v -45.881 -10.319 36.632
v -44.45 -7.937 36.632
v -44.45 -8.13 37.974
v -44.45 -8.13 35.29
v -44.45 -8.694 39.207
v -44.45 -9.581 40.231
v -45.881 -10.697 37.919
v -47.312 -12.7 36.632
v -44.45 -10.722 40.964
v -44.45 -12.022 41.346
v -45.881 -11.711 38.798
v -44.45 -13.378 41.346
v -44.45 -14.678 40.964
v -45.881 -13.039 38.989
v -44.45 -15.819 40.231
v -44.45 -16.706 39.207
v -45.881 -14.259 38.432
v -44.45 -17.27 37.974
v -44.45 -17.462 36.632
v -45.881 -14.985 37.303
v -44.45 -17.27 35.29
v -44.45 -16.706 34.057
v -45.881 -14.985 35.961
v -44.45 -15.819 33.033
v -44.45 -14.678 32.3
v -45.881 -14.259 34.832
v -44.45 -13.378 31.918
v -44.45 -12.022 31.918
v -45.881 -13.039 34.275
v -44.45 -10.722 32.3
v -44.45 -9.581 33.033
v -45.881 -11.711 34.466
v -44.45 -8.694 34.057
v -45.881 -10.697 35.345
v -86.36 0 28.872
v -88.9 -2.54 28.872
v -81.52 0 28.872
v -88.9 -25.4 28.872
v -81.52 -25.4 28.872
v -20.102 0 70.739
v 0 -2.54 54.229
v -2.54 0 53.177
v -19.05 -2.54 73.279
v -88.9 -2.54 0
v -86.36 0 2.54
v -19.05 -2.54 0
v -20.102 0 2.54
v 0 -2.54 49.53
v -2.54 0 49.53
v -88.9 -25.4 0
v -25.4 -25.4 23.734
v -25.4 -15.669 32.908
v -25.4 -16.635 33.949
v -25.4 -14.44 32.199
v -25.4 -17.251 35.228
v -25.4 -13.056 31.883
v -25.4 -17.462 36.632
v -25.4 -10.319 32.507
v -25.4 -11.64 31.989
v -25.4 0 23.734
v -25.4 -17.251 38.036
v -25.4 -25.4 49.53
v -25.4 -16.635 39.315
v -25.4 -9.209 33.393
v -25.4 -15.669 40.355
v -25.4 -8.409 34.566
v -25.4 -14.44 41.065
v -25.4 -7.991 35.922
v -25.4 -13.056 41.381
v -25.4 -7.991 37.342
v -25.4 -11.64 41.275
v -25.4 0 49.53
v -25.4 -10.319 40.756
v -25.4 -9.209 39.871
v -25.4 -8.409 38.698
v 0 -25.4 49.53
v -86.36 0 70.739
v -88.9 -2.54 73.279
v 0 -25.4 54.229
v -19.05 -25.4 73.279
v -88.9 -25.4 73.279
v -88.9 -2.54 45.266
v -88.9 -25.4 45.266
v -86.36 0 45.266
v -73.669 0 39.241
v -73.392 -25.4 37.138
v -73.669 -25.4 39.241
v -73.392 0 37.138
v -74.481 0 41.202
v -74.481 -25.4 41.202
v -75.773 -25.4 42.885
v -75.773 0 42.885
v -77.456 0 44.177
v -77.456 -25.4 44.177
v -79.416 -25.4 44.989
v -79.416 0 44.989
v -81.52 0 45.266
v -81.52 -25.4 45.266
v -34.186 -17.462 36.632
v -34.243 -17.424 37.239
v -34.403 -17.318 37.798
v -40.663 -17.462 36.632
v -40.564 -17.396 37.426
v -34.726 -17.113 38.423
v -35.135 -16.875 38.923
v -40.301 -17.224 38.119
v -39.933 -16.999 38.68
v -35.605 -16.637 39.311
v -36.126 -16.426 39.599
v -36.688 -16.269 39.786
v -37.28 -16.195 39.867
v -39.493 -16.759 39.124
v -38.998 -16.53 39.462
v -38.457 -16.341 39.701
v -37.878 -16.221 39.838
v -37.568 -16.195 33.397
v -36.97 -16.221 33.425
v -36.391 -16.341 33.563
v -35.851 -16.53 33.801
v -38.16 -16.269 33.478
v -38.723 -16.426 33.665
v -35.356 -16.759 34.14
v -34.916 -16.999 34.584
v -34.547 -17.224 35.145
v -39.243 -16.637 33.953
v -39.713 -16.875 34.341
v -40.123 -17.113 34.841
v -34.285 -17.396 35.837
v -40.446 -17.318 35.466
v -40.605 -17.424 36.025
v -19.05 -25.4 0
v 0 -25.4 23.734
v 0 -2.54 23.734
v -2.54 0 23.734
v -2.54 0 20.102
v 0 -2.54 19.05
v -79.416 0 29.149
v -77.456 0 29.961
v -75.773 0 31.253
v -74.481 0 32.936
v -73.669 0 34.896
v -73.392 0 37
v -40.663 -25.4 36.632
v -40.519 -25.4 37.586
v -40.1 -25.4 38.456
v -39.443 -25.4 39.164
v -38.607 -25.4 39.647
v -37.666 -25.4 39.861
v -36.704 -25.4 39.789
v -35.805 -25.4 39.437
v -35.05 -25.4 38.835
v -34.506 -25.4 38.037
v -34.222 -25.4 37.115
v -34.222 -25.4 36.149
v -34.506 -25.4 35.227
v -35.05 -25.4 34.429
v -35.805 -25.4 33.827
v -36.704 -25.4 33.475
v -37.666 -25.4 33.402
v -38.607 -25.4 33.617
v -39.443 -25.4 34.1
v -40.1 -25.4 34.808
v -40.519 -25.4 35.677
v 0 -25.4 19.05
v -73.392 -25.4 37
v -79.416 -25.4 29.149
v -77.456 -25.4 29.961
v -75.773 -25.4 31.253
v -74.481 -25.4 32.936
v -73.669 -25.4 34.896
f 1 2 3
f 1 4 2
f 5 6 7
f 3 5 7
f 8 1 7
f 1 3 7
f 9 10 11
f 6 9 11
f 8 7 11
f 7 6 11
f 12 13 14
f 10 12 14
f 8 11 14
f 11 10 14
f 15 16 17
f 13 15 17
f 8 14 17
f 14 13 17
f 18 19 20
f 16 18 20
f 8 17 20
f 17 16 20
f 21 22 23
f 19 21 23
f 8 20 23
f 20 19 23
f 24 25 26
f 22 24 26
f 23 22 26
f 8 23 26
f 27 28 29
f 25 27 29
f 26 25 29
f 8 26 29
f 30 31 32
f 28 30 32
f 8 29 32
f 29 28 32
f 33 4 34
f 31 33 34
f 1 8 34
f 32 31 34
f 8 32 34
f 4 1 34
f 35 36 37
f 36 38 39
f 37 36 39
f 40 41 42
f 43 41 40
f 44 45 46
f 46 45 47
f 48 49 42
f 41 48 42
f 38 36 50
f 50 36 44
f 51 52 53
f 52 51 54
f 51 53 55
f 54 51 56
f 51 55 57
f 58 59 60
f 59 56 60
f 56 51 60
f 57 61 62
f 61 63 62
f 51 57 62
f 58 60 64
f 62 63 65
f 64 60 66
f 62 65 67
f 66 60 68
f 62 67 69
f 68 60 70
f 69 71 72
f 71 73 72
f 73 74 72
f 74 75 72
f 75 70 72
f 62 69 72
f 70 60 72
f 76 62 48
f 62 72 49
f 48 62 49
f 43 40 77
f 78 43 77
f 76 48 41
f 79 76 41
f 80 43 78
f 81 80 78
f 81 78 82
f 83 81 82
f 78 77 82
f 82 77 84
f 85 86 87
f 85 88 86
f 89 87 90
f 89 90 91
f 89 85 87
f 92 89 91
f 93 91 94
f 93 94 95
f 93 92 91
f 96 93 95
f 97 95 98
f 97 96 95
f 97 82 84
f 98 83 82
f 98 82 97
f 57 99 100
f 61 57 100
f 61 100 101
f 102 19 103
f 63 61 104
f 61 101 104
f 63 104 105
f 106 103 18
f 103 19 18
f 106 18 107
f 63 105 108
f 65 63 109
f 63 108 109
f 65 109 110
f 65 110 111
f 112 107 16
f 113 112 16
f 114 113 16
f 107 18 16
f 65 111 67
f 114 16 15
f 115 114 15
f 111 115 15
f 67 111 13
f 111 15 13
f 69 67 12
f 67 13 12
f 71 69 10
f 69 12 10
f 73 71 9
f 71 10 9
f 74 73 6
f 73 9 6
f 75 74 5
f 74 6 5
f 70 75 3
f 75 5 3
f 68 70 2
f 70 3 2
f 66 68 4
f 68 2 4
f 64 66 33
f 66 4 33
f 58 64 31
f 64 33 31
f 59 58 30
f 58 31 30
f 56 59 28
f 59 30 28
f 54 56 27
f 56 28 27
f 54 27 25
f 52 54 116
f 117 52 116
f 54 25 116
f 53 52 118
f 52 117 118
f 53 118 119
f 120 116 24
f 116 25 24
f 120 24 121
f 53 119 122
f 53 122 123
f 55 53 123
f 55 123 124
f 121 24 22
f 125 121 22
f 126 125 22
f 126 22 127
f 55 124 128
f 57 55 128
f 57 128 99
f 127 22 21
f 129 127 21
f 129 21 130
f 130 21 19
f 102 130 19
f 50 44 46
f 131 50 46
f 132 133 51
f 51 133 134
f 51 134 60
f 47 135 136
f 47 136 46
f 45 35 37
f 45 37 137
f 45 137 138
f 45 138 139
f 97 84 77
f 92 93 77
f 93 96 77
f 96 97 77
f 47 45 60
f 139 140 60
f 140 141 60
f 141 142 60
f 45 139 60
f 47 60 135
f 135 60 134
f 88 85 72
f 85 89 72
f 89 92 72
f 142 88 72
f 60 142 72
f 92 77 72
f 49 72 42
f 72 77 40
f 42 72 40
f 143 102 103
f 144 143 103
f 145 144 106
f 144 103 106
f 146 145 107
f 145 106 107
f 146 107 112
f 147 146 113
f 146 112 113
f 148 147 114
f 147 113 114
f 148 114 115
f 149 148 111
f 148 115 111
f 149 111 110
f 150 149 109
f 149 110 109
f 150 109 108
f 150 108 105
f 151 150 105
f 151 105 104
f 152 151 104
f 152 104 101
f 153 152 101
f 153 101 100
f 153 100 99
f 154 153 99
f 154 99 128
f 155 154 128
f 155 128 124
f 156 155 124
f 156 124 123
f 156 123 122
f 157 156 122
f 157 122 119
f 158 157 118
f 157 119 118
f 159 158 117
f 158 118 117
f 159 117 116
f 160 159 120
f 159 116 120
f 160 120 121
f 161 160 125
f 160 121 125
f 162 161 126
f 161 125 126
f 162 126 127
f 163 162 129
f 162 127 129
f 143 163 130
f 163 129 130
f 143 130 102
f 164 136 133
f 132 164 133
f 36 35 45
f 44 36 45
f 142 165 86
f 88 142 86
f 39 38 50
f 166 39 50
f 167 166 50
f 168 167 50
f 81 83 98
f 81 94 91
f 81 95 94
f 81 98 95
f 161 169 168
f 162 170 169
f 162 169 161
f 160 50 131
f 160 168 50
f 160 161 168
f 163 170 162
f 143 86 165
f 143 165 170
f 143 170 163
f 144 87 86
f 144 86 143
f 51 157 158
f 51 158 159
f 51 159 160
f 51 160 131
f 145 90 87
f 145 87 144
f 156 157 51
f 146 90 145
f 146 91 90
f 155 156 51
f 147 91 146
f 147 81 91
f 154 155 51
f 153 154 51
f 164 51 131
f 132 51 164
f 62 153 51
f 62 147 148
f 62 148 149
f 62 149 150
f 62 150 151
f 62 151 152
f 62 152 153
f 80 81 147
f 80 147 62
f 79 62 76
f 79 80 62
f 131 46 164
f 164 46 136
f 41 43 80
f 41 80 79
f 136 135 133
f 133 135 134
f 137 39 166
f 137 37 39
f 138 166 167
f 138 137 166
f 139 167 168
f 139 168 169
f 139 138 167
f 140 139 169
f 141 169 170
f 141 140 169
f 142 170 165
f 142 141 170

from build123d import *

# Parameters (mm, degrees)
F1_DEPTH    = 25.4
F2_SIZE     = 2.54
F3_T1_DEPTH = 120.8411218415
F4_SIZE     = 2.54
F5_W        = 15.5079813242
F5_H        = 16.3934864104
F6_DEPTH    = 25.4
F7_R        = 8.128
F9_D        = 9.525
F9_DEPTH    = 19.05
F9_TIP      = 2.8615986981
F11_D       = 6.477
F11_DEPTH   = 14.2748
F11_TIP     = 1.9458871147


# Not quite as in the source:
# - a fillet or chamfer that OpenCascade refuses, or shapes differently, is made with other operations: its cross-section is extruded or revolved along the edge and cut away or added


with BuildPart() as f1:
    # F0 (on Front) → F1 (new body)
    with BuildSketch(Plane.XZ):
        Polygon((-88.9, 0), (0, 0), (0, 23.7338524312), (-25.4, 23.7338524312), (-25.4, 49.53), (0, 49.53), (0, 73.279), (-88.9, 73.279), align=None)
    extrude(amount=F1_DEPTH)

    # F2
    f2_edges = [f1.edges().sort_by_distance(p)[0] for p in [
        (-44.45, 0, 73.279),
        (0, 0, 61.4045),
        (-88.9, 0, 36.6395),
        (-44.45, 0, 0),
        (0, 0, 11.866926),
    ]]
    chamfer(f2_edges, length=F2_SIZE)

    # F3: chamfer of 19.05 on 2 edges, made by hand

    # F3_s2 → F3_t1 (cut)
    with BuildSketch(Plane.XZ.offset(-46.4505609208)):
        Polygon((-19.05, 73.279), (0, 54.229), (0, 73.279), align=None)
        Polygon((-19.05, 0), (0, 19.05), (0, 0), align=None)
    extrude(amount=F3_T1_DEPTH, mode=Mode.SUBTRACT)

    # F4
    f4_edges = [f1.edges().sort_by_distance(p)[0] for p in [
        (-9.525, 0, 63.754),
        (-9.525, 0, 9.525),
    ]]
    chamfer(f4_edges, length=F4_SIZE)

    # F5 (on face) → F6 (cut)
    with BuildSketch(Plane.XZ.offset(25.4)):
        with Locations((-81.1460093379, 37.0688531548)):
            Rectangle(F5_W, F5_H)
    extrude(amount=-F6_DEPTH, mode=Mode.SUBTRACT)

    # F7
    f7_edges = [f1.edges().sort_by_distance(p)[0] for p in [
        (-73.392019, -12.7, 45.265596),
        (-73.392019, -12.7, 28.87211),
    ]]
    fillet(f7_edges, radius=F7_R)

    # F9
    with Locations(Plane.YZ.offset(-25.4)):
        with Locations((-12.7, 36.6319262156)):
            Hole(F9_D / 2, depth=F9_DEPTH)
            with Locations((0, 0, -(F9_DEPTH + F9_TIP / 2))):  # 118° drill point
                Cone(0, F9_D / 2, F9_TIP, mode=Mode.SUBTRACT)

    # F11
    with Locations(Plane.XZ.offset(25.4)):
        with Locations((-37.4242216349, 36.6319262156)):
            Hole(F11_D / 2, depth=F11_DEPTH)
            with Locations((0, 0, -(F11_DEPTH + F11_TIP / 2))):  # 118° drill point
                Cone(0, F11_D / 2, F11_TIP, mode=Mode.SUBTRACT)


solid = f1.part
